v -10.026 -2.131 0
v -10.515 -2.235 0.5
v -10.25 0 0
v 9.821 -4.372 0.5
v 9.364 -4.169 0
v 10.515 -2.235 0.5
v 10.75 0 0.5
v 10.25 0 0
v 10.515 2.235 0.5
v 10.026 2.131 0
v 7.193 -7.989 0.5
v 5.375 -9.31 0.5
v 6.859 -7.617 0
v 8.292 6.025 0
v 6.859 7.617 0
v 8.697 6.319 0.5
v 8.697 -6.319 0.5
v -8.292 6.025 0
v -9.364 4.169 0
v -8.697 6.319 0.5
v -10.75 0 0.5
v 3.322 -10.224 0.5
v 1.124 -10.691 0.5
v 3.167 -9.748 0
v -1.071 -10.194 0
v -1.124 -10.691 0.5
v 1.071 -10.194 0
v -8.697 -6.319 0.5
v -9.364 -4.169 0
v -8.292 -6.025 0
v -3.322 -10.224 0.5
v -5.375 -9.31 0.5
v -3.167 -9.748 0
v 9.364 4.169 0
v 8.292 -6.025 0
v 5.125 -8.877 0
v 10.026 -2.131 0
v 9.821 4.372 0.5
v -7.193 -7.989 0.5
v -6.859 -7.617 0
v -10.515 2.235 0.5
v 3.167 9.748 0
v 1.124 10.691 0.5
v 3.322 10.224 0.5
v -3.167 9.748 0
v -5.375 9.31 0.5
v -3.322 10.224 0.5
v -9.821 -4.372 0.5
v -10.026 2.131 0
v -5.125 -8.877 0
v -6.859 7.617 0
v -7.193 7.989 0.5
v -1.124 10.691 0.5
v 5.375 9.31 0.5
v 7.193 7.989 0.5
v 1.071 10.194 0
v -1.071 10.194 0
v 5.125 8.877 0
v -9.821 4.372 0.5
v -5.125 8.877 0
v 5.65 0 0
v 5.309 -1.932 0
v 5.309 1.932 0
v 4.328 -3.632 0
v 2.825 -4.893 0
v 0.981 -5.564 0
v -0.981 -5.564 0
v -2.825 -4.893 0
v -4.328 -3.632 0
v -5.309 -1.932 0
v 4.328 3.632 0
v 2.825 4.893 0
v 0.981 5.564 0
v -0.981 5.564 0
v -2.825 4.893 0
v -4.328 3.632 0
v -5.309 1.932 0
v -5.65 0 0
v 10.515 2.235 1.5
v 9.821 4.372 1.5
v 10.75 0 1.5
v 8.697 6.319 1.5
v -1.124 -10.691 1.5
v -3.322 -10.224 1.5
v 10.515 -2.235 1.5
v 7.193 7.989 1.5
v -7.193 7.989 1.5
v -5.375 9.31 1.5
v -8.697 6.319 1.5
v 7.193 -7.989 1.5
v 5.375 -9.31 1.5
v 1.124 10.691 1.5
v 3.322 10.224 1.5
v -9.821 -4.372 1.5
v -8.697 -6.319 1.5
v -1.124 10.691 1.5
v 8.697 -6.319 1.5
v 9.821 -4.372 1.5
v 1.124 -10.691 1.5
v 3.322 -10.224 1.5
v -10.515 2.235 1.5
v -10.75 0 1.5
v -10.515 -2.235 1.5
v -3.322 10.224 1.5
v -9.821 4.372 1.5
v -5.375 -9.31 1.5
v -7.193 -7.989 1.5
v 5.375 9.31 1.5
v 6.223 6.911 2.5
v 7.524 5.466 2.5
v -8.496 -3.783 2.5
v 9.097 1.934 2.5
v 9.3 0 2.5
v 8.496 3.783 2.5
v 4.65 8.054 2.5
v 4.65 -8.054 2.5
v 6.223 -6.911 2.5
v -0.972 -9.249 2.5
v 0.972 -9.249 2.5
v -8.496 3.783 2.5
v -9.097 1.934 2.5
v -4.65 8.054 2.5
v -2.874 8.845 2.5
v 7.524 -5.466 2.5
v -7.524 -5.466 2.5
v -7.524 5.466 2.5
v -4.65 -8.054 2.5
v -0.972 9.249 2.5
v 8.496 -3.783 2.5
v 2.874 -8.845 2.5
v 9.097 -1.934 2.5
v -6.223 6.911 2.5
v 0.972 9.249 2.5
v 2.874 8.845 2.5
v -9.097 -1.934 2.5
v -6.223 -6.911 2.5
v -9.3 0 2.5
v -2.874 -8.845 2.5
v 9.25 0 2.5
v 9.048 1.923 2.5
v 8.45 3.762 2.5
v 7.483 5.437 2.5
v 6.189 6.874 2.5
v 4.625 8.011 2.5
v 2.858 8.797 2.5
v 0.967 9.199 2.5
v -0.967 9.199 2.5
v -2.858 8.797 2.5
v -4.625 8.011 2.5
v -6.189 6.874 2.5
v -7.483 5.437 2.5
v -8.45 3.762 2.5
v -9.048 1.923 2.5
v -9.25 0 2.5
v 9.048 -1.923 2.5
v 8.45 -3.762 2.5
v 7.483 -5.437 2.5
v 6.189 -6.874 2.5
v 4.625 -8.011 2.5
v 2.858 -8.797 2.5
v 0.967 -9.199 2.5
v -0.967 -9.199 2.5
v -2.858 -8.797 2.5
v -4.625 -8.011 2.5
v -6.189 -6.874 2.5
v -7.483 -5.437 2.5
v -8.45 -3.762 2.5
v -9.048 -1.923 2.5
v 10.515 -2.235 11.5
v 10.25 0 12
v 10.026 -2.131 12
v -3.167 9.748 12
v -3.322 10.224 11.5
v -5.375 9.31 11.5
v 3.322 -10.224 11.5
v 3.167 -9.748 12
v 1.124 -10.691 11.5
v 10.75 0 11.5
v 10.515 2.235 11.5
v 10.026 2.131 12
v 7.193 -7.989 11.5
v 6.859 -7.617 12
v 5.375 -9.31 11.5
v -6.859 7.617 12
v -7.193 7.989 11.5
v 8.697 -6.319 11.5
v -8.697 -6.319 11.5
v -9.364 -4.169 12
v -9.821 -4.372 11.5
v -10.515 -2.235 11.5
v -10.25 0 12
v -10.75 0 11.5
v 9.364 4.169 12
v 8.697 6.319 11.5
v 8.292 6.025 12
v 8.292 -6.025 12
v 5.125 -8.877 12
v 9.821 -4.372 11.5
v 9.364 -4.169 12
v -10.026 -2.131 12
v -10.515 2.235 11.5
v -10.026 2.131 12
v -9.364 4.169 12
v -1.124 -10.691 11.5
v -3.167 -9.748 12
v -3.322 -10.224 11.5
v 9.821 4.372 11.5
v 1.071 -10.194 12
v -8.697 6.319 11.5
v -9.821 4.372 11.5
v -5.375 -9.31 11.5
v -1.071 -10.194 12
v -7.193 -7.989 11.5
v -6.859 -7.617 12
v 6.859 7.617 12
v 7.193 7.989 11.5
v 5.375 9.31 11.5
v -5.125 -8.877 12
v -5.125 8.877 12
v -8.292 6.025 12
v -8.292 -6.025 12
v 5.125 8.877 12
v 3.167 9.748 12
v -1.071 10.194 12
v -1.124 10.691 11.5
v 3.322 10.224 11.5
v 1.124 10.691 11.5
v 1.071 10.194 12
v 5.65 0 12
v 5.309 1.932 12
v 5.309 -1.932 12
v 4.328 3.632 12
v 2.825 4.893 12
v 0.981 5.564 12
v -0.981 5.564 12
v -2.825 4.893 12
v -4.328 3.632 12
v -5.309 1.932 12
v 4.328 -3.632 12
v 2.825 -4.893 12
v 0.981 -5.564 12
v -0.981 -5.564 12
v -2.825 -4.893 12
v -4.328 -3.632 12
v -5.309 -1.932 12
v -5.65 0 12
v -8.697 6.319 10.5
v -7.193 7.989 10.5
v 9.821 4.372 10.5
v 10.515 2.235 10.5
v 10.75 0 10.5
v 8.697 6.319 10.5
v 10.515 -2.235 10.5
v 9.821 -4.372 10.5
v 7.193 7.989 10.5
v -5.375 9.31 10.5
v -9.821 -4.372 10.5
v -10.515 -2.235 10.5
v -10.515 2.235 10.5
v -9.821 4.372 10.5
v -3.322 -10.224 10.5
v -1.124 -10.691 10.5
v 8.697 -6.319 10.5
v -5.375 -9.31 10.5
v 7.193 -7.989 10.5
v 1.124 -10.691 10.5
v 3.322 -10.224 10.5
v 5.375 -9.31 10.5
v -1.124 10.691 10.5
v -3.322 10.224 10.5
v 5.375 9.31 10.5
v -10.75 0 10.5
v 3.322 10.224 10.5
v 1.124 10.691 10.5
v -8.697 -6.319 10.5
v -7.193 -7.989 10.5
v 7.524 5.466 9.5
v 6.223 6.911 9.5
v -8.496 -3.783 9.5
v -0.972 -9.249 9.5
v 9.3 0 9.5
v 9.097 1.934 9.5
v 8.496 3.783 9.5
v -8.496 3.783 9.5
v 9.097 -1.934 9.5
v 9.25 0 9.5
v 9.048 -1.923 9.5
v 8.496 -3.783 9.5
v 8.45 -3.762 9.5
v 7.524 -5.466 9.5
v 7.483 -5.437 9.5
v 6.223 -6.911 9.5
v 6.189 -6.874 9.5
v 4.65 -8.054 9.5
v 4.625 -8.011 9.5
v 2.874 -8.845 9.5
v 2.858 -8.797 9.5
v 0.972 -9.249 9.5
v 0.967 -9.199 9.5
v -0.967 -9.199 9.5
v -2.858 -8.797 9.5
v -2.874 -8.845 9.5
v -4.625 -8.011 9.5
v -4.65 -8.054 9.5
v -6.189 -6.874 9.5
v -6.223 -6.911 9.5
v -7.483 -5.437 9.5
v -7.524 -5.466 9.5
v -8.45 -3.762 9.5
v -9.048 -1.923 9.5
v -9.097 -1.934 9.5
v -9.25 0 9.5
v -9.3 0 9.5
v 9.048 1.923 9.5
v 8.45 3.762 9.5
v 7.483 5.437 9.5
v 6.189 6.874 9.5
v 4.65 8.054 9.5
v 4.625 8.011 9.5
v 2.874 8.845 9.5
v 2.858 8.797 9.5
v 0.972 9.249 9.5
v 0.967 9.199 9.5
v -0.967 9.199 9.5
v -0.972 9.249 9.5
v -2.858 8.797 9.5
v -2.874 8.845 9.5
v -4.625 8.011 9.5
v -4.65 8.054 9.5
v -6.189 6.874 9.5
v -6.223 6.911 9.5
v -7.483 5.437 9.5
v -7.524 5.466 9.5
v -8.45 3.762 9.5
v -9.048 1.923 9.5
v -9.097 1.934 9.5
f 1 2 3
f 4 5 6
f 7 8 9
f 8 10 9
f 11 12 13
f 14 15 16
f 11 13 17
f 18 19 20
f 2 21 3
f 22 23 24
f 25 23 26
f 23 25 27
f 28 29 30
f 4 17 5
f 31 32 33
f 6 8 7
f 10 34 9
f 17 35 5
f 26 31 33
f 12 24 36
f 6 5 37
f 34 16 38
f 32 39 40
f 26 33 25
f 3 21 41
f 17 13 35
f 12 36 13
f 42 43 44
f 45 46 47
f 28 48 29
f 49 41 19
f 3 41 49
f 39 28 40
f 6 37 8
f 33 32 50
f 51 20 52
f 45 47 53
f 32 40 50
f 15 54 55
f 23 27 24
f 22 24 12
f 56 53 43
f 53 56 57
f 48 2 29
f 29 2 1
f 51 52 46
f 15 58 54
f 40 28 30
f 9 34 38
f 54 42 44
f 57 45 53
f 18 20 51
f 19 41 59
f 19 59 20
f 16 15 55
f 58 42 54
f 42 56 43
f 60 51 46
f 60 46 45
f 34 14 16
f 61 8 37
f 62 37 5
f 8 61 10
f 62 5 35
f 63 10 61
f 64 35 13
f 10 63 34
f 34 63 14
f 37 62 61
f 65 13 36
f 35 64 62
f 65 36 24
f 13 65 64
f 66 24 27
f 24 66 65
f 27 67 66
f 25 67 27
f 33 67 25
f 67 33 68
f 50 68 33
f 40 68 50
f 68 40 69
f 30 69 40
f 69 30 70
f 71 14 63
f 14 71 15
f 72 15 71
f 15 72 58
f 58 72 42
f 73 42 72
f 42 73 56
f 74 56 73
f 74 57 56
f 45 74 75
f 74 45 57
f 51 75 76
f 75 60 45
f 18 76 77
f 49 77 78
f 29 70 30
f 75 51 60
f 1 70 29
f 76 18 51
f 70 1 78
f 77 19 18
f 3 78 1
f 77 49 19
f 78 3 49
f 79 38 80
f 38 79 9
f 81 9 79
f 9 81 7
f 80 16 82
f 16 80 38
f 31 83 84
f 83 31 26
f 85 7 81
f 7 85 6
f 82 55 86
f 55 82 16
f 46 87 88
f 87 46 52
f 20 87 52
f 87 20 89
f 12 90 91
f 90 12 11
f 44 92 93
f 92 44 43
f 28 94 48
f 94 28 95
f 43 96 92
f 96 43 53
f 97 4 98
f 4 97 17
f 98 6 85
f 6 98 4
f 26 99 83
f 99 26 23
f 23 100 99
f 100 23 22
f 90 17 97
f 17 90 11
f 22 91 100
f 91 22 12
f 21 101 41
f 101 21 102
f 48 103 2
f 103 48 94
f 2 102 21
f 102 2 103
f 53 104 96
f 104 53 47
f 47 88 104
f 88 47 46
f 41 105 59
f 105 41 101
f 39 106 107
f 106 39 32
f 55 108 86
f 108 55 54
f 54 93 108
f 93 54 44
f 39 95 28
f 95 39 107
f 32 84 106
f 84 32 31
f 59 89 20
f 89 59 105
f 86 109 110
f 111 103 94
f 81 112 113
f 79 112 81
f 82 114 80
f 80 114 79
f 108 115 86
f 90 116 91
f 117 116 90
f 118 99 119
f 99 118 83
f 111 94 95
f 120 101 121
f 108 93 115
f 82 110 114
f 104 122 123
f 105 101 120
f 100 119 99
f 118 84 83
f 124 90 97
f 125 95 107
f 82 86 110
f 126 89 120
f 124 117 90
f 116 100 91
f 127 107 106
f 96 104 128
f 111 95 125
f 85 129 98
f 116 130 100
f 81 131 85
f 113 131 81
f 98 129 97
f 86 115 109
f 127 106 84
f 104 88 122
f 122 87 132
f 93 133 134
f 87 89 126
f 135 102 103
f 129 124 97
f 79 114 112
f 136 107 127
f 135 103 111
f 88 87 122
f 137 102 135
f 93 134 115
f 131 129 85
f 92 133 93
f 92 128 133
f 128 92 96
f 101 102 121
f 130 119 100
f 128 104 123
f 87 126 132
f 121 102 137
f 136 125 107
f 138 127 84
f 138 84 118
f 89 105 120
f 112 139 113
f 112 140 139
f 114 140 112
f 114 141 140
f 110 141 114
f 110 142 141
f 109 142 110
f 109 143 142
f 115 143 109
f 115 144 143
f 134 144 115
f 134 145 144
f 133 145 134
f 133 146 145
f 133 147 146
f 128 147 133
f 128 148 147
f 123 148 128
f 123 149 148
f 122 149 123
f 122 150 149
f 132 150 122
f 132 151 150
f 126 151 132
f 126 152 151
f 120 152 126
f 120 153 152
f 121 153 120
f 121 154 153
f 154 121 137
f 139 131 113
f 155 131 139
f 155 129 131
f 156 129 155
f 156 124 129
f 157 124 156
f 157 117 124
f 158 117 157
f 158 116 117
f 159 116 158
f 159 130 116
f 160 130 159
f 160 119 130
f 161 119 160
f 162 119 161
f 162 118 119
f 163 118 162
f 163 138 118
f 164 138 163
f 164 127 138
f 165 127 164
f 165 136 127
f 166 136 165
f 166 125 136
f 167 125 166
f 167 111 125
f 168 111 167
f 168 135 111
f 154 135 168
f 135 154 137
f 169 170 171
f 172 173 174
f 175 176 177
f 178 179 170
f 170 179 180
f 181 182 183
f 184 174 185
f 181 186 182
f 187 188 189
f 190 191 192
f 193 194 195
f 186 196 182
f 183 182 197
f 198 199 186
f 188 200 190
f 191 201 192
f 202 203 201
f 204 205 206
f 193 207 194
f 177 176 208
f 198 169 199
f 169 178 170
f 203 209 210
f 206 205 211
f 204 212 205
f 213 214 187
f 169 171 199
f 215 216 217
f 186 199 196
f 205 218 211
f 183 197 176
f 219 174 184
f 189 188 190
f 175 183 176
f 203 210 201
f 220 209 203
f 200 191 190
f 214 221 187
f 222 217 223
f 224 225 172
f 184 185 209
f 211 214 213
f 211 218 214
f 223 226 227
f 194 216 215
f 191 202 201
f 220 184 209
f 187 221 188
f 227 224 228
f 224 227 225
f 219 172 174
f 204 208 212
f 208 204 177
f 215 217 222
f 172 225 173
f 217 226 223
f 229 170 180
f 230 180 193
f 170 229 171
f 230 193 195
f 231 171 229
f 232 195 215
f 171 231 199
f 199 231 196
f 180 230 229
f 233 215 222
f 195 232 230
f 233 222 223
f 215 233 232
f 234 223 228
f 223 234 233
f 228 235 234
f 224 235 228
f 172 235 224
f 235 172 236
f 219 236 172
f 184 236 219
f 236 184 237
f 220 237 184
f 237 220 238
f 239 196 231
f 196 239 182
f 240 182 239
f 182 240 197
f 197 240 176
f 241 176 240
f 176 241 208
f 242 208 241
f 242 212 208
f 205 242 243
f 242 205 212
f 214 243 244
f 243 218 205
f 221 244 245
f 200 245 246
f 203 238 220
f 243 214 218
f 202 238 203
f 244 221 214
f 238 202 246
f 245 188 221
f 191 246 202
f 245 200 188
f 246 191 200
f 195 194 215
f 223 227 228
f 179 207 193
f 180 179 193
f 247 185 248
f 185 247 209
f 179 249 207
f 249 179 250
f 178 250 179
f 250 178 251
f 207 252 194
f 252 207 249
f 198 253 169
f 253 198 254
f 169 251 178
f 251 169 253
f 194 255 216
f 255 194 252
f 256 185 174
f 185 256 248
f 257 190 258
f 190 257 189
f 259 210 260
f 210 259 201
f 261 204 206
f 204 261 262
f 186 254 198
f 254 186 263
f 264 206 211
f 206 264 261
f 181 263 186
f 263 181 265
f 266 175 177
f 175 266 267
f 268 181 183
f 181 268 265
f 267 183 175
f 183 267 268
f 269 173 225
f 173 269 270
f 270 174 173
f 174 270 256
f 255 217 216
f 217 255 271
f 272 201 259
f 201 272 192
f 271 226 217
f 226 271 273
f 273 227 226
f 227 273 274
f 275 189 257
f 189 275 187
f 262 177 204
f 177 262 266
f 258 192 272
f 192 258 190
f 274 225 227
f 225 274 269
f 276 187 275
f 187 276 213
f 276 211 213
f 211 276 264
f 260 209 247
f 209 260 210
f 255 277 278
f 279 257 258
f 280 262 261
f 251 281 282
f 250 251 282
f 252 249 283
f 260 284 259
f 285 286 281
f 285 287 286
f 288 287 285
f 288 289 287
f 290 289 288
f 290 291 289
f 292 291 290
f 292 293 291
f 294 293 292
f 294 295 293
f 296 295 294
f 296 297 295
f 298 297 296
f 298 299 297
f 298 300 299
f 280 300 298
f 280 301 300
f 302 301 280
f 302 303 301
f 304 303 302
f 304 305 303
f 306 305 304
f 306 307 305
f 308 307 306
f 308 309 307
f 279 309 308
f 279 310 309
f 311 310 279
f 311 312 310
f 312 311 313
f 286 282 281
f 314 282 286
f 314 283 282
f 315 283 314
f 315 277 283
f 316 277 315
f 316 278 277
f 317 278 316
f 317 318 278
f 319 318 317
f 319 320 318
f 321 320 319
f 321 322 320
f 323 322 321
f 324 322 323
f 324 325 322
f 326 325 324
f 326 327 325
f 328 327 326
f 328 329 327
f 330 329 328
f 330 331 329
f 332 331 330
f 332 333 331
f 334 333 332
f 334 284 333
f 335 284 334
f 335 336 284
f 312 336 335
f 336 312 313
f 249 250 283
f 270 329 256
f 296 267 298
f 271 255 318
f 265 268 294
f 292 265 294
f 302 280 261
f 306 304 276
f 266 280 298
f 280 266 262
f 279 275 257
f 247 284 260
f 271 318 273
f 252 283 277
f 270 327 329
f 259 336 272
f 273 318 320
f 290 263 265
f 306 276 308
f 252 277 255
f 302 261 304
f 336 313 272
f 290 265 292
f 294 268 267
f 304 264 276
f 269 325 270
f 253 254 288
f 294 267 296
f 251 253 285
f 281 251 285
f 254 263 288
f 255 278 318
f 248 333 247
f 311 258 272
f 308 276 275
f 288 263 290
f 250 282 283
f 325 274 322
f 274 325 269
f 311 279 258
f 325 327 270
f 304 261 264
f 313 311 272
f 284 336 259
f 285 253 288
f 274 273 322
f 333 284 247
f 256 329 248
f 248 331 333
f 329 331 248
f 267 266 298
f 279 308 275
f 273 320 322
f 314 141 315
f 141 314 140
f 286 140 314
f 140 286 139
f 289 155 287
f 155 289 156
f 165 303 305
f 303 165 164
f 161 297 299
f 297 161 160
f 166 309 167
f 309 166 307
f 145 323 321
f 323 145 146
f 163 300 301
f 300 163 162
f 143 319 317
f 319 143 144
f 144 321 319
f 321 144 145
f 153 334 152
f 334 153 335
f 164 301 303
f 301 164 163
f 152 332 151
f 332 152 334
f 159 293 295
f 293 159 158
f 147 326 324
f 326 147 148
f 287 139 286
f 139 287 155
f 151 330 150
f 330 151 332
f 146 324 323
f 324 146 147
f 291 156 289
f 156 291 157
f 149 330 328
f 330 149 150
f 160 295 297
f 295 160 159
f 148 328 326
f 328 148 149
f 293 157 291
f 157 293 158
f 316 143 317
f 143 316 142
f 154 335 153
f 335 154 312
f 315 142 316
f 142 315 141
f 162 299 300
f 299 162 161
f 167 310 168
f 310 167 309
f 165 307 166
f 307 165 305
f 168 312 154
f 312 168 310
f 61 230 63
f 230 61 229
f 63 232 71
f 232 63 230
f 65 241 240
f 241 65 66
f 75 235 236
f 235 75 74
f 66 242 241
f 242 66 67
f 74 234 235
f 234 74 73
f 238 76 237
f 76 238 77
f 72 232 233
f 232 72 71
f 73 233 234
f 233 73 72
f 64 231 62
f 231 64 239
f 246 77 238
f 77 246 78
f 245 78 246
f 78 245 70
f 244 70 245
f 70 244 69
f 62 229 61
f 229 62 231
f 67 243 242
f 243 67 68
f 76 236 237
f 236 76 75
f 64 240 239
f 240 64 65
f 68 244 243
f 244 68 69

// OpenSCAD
// file: cfg.scad
use <./lib/bearing.scad>

PX = 250;
PY = 290;
PZ = 250;

PROFILE_SIZE = 20;
PROFILE_PLAY = 0.2;
PROFILE_SCREW = 3;
R_PLAY = 0.3;

WALL = 4;
ZBUFF = 0.2;

XY_SPACE = 20;
XY_ROD_SPACE = 18.5;
CARRIAGE_ROD_SPACE = XY_ROD_SPACE - (0.5/2);
XY_ROD = 6;
XY_PULLEY = 12; //20 theeth
XY_BEARING = 626;
XY_BEARING_MIN_WALL = 1.8;


XY_CARRIAGE_SPACE = 20;
XY_CARRIAGE_MAGNET = 4;
MAGNET_X = 11;
MAGNET_D = 4;
MAGNET_H = 2;


motorSize = 42.5; //38 for NEMA14, 45 for NEMA17
motorScrewSpacing = 31; //26 for NEMA14, 31 for NEMA17
motorH = 35.25;
motorPulley = 14;


HALL_X = 4.2 + 1;
HALL_Y = 3.1 + 0.25;
HALL_Z = 2.0 + 0.4;

//--- Calced
PROFILE = PROFILE_SIZE + PROFILE_PLAY*2;
PROF_S = PROFILE_SIZE; //shorthand
mScrewSpace = (motorSize-motorScrewSpacing) / 2; //Space from motorcorner to next screw hole



XY_BEAR_D = get_bearing_outer_diam(XY_BEARING);
XY_BEAR_R = XY_BEAR_D/2;
XY_BEAR_H = get_bearing_height(XY_BEARING);
XY_BEAR_MW = XY_BEARING_MIN_WALL; //short hand

XY_ROD_R = XY_ROD / 2;

X_BEARING_POS = XY_BEAR_D/2+XY_BEARING_MIN_WALL;
X_BEAR_POS = X_BEARING_POS;

BELT_GUID_R = XY_BEAR_D/2+mScrewSpace - XY_PULLEY/2;
BELT_GUID_D = BELT_GUID_R * 2;
// main file
use <./lib/bcad.scad>
include <./cfg.scad>

beltGuide();

module betlGuideRamp(d) {
    cylinder(d=d+2,d2=d+3, h=0.5);
    up(0.5) cylinder(d=d+3, h=1);
    up(1.5) cylinder(d=d+3,d2=d+.1, h=1);    
}

module beltGuide(d=18.5, noBearing=false) {
    difference() {
        union() {
            betlGuideRamp(d);
            up(2.5) cylinder(d=d,h=12-2.5-2.5);
            up(12) zflip() betlGuideRamp(d);
        }
        down(1)
            cylinder(d=11+0.3,h=20);
    }    
}
